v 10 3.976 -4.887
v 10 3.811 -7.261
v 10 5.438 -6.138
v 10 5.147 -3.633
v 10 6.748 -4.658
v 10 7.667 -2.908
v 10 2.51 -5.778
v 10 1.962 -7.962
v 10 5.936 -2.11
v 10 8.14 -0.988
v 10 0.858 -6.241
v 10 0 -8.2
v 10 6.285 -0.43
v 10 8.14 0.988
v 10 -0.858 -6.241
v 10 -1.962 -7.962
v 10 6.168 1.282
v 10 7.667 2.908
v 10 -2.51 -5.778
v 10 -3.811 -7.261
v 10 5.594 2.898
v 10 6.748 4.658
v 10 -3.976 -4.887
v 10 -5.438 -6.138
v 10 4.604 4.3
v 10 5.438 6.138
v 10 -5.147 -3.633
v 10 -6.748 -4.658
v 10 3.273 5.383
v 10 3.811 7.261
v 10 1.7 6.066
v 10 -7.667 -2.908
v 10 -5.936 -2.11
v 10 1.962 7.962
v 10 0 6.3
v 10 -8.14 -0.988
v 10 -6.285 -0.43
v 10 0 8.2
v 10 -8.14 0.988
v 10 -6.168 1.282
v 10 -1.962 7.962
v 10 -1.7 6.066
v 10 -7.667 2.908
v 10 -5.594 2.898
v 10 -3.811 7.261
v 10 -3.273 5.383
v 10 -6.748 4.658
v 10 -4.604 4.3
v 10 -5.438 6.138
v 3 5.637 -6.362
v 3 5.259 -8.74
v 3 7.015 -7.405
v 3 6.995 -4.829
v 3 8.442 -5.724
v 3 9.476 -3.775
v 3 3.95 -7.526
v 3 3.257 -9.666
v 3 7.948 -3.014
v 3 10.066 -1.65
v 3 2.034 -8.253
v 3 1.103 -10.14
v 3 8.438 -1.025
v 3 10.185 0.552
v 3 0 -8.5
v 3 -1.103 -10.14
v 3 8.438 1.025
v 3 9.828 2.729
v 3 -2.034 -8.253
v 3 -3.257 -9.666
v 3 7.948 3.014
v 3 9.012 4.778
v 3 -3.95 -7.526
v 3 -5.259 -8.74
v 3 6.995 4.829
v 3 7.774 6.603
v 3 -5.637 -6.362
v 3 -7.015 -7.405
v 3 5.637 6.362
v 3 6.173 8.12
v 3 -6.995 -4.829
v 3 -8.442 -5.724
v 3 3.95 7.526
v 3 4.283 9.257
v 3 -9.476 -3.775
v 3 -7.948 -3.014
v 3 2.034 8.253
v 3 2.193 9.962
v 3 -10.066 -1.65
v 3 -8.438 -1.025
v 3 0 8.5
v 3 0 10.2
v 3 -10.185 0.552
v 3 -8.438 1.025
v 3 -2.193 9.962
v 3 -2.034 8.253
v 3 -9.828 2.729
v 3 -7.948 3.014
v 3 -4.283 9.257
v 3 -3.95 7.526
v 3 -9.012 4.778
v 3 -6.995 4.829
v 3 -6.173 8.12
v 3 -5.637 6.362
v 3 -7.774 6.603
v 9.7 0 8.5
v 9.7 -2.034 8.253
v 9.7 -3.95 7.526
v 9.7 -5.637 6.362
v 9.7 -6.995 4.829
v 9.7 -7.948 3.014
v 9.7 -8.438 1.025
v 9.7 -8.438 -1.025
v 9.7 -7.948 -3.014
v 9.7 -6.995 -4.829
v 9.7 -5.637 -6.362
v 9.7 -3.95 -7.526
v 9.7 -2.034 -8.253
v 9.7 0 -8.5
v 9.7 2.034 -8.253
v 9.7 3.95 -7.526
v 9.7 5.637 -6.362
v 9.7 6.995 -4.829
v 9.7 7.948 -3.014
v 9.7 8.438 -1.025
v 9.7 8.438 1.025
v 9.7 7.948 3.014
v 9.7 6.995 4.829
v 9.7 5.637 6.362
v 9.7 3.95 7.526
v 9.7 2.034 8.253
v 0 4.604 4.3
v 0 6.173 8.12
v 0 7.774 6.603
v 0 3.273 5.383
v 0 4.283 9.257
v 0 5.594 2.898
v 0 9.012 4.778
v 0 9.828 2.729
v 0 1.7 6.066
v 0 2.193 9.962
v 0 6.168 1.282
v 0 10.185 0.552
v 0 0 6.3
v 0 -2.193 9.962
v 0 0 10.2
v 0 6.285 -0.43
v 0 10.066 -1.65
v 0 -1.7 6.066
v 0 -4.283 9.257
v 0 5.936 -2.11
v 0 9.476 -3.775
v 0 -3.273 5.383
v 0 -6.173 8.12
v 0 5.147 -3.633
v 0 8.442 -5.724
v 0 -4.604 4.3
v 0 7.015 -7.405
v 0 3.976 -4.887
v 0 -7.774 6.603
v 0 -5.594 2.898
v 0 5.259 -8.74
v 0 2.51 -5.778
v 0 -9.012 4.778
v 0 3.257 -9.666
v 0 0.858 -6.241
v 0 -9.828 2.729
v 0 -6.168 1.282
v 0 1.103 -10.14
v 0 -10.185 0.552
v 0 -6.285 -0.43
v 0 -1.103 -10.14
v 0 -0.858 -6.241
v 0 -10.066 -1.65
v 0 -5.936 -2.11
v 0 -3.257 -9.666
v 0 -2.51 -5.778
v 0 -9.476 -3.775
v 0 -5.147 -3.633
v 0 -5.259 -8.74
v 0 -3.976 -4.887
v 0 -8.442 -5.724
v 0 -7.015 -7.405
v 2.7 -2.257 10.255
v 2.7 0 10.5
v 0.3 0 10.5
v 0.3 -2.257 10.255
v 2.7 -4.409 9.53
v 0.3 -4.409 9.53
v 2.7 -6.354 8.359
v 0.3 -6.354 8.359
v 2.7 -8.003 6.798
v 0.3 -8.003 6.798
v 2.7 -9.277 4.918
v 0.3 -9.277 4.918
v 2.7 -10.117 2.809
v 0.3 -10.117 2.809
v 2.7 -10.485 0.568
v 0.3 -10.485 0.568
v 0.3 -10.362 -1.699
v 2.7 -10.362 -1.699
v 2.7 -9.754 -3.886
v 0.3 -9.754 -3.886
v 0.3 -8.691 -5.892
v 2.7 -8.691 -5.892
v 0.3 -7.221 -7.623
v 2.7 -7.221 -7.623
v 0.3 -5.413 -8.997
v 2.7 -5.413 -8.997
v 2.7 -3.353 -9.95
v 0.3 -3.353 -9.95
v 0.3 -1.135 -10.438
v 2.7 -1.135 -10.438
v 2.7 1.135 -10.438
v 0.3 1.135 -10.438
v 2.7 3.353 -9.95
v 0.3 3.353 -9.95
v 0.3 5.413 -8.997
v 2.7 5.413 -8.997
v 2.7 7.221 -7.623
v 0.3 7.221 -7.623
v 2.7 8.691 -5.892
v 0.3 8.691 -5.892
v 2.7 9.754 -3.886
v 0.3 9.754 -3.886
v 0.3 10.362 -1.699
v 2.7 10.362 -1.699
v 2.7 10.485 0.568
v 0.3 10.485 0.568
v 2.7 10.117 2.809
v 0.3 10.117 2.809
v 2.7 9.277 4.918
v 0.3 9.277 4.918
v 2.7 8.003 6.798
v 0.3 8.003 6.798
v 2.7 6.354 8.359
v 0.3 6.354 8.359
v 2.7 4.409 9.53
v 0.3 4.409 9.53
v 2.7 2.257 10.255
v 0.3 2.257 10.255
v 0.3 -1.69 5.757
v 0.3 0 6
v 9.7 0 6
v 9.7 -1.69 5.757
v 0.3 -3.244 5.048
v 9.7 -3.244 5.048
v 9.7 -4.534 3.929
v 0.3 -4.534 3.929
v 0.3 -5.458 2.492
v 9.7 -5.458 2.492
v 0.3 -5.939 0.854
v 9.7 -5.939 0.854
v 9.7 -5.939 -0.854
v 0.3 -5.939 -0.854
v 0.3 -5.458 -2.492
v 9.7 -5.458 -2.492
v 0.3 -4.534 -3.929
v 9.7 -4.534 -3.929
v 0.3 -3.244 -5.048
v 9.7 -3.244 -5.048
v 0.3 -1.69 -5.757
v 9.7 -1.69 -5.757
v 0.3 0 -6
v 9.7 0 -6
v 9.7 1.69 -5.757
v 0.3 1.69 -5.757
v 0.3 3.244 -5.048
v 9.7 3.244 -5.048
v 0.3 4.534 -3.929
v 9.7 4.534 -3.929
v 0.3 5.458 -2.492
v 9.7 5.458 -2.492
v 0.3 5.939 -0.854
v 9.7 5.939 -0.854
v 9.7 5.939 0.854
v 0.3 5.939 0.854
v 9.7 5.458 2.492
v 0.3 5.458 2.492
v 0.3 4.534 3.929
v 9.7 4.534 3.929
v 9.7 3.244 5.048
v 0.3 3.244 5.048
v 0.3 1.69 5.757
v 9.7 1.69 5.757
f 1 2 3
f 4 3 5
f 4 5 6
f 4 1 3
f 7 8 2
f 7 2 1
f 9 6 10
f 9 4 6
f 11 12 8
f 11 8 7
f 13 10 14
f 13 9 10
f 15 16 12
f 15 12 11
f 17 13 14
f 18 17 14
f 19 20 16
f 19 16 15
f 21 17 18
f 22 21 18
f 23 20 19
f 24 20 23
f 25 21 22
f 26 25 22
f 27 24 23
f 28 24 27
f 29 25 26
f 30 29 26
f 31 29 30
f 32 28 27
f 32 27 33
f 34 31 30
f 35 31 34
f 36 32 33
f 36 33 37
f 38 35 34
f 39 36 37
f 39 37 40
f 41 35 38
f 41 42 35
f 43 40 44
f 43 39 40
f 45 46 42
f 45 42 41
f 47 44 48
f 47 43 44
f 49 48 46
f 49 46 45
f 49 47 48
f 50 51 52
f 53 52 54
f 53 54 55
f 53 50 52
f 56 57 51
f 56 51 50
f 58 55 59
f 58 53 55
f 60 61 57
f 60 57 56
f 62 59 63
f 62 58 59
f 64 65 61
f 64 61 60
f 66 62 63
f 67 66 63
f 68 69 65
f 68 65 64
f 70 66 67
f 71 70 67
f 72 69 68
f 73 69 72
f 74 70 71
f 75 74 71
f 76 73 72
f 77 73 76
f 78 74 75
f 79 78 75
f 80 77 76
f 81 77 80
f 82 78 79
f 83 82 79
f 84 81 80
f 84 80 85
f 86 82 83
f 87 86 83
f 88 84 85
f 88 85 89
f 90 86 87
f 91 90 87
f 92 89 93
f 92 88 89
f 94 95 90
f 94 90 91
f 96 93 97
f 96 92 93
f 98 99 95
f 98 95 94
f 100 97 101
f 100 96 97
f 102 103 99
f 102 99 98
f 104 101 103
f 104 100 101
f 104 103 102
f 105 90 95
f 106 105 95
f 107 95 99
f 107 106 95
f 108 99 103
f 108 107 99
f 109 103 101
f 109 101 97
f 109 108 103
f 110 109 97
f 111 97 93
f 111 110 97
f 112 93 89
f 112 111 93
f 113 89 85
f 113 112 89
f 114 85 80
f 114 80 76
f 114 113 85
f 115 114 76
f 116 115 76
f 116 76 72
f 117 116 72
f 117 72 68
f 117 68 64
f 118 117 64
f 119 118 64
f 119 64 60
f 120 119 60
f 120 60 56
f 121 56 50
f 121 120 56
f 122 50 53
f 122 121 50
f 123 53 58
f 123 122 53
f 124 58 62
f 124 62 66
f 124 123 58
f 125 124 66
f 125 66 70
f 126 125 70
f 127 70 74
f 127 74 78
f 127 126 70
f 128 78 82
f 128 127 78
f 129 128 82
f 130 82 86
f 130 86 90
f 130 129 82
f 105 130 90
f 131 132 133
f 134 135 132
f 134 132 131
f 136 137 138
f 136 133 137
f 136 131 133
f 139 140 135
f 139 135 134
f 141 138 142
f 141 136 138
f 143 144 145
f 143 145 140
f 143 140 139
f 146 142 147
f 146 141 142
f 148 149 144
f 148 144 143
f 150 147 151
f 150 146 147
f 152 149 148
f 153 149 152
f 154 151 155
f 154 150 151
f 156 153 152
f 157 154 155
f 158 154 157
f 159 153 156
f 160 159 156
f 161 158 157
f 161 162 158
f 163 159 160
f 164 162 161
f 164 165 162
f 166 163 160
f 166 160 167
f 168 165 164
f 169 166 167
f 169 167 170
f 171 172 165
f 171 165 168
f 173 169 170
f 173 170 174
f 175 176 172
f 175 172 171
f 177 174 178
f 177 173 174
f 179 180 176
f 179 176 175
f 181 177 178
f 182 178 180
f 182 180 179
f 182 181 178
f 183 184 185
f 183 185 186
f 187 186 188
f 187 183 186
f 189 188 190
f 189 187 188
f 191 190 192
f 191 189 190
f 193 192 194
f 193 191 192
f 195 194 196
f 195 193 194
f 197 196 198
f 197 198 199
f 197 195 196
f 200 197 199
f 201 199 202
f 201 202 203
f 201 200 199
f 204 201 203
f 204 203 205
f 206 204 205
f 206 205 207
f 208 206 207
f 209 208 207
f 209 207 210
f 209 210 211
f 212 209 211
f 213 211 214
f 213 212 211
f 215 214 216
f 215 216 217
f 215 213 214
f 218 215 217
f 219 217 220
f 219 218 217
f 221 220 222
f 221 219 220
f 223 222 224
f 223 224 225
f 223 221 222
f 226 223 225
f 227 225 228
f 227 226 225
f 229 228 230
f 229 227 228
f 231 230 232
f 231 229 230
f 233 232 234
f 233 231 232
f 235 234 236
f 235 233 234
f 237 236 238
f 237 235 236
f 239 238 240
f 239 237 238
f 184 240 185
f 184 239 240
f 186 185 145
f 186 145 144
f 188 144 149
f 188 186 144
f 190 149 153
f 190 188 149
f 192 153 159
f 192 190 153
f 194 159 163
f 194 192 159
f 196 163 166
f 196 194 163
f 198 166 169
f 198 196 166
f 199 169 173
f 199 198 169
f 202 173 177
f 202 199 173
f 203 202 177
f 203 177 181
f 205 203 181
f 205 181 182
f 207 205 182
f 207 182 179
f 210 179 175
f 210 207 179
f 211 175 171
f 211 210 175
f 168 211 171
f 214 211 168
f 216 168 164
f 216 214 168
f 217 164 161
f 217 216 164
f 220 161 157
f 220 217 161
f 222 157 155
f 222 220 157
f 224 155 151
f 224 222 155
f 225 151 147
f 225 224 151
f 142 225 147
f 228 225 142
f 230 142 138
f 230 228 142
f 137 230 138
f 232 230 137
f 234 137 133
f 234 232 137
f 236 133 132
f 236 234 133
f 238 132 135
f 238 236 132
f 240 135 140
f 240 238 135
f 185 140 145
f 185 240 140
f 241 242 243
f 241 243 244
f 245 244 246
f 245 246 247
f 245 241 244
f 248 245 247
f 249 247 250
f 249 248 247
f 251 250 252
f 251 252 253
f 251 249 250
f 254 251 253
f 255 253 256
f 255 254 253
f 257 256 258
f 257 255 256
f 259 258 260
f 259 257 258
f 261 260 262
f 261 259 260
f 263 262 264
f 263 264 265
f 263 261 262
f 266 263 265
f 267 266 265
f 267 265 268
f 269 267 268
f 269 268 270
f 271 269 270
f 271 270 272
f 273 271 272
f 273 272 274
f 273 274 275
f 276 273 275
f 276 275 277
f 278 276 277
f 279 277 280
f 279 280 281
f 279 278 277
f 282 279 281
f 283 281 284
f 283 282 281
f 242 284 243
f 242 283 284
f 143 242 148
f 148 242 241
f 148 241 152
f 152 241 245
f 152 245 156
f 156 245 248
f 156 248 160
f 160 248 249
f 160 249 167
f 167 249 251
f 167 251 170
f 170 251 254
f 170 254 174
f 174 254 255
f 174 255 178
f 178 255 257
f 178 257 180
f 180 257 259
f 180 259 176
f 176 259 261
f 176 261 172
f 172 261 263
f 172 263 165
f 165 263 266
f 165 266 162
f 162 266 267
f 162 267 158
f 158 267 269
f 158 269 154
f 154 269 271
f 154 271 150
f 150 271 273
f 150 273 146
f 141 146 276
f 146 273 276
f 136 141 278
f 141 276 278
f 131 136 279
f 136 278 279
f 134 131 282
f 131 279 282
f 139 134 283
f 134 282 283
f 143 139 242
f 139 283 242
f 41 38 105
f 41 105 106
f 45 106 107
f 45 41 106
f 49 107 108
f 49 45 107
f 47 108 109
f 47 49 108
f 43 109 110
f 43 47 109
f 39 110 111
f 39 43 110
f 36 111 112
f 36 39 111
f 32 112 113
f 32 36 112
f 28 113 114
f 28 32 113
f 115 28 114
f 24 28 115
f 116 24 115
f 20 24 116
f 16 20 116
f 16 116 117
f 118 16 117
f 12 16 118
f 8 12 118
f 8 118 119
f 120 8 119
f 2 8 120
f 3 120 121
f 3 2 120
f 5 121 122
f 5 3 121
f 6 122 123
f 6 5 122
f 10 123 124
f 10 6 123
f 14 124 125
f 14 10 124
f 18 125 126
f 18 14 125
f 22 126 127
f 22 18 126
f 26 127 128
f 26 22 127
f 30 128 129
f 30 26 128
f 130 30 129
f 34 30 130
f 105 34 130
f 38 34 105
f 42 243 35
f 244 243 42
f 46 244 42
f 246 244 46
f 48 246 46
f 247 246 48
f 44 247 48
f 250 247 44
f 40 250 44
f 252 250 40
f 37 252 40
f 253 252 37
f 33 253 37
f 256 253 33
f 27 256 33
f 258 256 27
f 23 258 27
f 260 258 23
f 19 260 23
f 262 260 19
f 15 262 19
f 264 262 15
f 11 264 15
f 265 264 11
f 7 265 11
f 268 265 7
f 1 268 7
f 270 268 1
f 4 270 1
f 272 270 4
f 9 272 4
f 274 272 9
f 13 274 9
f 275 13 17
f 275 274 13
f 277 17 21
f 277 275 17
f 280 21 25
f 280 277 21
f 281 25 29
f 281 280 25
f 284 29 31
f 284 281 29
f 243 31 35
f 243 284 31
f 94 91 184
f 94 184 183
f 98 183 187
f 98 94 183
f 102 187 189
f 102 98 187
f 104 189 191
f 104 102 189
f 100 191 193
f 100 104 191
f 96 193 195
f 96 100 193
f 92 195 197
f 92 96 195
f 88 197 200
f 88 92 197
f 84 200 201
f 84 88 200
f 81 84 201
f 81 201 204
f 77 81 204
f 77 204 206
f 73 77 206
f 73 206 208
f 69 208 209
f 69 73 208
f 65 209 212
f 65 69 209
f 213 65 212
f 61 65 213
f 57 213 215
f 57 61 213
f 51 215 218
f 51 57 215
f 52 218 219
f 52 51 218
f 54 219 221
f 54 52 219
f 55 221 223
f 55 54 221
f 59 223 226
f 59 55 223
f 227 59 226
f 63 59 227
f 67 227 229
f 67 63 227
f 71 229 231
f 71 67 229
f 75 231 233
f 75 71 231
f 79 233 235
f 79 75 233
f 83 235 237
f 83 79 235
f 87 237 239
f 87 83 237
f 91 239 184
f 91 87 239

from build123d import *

# Parameters (mm, degrees)
CHAMFER1_SIZE = 0.3


with BuildPart() as part:
    # Sketch1 → Revolve1 (revolve)
    with BuildSketch(Plane.XY, mode=Mode.PRIVATE) as revolve1_sk:
        Polygon((0, 6), (0, 10.5), (3, 10.5), (3, 8.5), (10, 8.5), (10, 6), align=None)
    revolve(revolve1_sk.sketch.rotate(Axis((0, 0, 0), (1, 0, 0)), 90), axis=Axis((0, 0, 0), (1, 0, 0)))

    # Chamfer1
    chamfer1_edges = [part.edges().sort_by_distance(p)[0] for p in [
        (10, 0, -6),
        (10, 0, -8.5),
        (3, 0, -10.5),
        (0, 0, -10.5),
        (0, 0, -6),
    ]]
    chamfer(chamfer1_edges, length=CHAMFER1_SIZE)


solid = part.part
